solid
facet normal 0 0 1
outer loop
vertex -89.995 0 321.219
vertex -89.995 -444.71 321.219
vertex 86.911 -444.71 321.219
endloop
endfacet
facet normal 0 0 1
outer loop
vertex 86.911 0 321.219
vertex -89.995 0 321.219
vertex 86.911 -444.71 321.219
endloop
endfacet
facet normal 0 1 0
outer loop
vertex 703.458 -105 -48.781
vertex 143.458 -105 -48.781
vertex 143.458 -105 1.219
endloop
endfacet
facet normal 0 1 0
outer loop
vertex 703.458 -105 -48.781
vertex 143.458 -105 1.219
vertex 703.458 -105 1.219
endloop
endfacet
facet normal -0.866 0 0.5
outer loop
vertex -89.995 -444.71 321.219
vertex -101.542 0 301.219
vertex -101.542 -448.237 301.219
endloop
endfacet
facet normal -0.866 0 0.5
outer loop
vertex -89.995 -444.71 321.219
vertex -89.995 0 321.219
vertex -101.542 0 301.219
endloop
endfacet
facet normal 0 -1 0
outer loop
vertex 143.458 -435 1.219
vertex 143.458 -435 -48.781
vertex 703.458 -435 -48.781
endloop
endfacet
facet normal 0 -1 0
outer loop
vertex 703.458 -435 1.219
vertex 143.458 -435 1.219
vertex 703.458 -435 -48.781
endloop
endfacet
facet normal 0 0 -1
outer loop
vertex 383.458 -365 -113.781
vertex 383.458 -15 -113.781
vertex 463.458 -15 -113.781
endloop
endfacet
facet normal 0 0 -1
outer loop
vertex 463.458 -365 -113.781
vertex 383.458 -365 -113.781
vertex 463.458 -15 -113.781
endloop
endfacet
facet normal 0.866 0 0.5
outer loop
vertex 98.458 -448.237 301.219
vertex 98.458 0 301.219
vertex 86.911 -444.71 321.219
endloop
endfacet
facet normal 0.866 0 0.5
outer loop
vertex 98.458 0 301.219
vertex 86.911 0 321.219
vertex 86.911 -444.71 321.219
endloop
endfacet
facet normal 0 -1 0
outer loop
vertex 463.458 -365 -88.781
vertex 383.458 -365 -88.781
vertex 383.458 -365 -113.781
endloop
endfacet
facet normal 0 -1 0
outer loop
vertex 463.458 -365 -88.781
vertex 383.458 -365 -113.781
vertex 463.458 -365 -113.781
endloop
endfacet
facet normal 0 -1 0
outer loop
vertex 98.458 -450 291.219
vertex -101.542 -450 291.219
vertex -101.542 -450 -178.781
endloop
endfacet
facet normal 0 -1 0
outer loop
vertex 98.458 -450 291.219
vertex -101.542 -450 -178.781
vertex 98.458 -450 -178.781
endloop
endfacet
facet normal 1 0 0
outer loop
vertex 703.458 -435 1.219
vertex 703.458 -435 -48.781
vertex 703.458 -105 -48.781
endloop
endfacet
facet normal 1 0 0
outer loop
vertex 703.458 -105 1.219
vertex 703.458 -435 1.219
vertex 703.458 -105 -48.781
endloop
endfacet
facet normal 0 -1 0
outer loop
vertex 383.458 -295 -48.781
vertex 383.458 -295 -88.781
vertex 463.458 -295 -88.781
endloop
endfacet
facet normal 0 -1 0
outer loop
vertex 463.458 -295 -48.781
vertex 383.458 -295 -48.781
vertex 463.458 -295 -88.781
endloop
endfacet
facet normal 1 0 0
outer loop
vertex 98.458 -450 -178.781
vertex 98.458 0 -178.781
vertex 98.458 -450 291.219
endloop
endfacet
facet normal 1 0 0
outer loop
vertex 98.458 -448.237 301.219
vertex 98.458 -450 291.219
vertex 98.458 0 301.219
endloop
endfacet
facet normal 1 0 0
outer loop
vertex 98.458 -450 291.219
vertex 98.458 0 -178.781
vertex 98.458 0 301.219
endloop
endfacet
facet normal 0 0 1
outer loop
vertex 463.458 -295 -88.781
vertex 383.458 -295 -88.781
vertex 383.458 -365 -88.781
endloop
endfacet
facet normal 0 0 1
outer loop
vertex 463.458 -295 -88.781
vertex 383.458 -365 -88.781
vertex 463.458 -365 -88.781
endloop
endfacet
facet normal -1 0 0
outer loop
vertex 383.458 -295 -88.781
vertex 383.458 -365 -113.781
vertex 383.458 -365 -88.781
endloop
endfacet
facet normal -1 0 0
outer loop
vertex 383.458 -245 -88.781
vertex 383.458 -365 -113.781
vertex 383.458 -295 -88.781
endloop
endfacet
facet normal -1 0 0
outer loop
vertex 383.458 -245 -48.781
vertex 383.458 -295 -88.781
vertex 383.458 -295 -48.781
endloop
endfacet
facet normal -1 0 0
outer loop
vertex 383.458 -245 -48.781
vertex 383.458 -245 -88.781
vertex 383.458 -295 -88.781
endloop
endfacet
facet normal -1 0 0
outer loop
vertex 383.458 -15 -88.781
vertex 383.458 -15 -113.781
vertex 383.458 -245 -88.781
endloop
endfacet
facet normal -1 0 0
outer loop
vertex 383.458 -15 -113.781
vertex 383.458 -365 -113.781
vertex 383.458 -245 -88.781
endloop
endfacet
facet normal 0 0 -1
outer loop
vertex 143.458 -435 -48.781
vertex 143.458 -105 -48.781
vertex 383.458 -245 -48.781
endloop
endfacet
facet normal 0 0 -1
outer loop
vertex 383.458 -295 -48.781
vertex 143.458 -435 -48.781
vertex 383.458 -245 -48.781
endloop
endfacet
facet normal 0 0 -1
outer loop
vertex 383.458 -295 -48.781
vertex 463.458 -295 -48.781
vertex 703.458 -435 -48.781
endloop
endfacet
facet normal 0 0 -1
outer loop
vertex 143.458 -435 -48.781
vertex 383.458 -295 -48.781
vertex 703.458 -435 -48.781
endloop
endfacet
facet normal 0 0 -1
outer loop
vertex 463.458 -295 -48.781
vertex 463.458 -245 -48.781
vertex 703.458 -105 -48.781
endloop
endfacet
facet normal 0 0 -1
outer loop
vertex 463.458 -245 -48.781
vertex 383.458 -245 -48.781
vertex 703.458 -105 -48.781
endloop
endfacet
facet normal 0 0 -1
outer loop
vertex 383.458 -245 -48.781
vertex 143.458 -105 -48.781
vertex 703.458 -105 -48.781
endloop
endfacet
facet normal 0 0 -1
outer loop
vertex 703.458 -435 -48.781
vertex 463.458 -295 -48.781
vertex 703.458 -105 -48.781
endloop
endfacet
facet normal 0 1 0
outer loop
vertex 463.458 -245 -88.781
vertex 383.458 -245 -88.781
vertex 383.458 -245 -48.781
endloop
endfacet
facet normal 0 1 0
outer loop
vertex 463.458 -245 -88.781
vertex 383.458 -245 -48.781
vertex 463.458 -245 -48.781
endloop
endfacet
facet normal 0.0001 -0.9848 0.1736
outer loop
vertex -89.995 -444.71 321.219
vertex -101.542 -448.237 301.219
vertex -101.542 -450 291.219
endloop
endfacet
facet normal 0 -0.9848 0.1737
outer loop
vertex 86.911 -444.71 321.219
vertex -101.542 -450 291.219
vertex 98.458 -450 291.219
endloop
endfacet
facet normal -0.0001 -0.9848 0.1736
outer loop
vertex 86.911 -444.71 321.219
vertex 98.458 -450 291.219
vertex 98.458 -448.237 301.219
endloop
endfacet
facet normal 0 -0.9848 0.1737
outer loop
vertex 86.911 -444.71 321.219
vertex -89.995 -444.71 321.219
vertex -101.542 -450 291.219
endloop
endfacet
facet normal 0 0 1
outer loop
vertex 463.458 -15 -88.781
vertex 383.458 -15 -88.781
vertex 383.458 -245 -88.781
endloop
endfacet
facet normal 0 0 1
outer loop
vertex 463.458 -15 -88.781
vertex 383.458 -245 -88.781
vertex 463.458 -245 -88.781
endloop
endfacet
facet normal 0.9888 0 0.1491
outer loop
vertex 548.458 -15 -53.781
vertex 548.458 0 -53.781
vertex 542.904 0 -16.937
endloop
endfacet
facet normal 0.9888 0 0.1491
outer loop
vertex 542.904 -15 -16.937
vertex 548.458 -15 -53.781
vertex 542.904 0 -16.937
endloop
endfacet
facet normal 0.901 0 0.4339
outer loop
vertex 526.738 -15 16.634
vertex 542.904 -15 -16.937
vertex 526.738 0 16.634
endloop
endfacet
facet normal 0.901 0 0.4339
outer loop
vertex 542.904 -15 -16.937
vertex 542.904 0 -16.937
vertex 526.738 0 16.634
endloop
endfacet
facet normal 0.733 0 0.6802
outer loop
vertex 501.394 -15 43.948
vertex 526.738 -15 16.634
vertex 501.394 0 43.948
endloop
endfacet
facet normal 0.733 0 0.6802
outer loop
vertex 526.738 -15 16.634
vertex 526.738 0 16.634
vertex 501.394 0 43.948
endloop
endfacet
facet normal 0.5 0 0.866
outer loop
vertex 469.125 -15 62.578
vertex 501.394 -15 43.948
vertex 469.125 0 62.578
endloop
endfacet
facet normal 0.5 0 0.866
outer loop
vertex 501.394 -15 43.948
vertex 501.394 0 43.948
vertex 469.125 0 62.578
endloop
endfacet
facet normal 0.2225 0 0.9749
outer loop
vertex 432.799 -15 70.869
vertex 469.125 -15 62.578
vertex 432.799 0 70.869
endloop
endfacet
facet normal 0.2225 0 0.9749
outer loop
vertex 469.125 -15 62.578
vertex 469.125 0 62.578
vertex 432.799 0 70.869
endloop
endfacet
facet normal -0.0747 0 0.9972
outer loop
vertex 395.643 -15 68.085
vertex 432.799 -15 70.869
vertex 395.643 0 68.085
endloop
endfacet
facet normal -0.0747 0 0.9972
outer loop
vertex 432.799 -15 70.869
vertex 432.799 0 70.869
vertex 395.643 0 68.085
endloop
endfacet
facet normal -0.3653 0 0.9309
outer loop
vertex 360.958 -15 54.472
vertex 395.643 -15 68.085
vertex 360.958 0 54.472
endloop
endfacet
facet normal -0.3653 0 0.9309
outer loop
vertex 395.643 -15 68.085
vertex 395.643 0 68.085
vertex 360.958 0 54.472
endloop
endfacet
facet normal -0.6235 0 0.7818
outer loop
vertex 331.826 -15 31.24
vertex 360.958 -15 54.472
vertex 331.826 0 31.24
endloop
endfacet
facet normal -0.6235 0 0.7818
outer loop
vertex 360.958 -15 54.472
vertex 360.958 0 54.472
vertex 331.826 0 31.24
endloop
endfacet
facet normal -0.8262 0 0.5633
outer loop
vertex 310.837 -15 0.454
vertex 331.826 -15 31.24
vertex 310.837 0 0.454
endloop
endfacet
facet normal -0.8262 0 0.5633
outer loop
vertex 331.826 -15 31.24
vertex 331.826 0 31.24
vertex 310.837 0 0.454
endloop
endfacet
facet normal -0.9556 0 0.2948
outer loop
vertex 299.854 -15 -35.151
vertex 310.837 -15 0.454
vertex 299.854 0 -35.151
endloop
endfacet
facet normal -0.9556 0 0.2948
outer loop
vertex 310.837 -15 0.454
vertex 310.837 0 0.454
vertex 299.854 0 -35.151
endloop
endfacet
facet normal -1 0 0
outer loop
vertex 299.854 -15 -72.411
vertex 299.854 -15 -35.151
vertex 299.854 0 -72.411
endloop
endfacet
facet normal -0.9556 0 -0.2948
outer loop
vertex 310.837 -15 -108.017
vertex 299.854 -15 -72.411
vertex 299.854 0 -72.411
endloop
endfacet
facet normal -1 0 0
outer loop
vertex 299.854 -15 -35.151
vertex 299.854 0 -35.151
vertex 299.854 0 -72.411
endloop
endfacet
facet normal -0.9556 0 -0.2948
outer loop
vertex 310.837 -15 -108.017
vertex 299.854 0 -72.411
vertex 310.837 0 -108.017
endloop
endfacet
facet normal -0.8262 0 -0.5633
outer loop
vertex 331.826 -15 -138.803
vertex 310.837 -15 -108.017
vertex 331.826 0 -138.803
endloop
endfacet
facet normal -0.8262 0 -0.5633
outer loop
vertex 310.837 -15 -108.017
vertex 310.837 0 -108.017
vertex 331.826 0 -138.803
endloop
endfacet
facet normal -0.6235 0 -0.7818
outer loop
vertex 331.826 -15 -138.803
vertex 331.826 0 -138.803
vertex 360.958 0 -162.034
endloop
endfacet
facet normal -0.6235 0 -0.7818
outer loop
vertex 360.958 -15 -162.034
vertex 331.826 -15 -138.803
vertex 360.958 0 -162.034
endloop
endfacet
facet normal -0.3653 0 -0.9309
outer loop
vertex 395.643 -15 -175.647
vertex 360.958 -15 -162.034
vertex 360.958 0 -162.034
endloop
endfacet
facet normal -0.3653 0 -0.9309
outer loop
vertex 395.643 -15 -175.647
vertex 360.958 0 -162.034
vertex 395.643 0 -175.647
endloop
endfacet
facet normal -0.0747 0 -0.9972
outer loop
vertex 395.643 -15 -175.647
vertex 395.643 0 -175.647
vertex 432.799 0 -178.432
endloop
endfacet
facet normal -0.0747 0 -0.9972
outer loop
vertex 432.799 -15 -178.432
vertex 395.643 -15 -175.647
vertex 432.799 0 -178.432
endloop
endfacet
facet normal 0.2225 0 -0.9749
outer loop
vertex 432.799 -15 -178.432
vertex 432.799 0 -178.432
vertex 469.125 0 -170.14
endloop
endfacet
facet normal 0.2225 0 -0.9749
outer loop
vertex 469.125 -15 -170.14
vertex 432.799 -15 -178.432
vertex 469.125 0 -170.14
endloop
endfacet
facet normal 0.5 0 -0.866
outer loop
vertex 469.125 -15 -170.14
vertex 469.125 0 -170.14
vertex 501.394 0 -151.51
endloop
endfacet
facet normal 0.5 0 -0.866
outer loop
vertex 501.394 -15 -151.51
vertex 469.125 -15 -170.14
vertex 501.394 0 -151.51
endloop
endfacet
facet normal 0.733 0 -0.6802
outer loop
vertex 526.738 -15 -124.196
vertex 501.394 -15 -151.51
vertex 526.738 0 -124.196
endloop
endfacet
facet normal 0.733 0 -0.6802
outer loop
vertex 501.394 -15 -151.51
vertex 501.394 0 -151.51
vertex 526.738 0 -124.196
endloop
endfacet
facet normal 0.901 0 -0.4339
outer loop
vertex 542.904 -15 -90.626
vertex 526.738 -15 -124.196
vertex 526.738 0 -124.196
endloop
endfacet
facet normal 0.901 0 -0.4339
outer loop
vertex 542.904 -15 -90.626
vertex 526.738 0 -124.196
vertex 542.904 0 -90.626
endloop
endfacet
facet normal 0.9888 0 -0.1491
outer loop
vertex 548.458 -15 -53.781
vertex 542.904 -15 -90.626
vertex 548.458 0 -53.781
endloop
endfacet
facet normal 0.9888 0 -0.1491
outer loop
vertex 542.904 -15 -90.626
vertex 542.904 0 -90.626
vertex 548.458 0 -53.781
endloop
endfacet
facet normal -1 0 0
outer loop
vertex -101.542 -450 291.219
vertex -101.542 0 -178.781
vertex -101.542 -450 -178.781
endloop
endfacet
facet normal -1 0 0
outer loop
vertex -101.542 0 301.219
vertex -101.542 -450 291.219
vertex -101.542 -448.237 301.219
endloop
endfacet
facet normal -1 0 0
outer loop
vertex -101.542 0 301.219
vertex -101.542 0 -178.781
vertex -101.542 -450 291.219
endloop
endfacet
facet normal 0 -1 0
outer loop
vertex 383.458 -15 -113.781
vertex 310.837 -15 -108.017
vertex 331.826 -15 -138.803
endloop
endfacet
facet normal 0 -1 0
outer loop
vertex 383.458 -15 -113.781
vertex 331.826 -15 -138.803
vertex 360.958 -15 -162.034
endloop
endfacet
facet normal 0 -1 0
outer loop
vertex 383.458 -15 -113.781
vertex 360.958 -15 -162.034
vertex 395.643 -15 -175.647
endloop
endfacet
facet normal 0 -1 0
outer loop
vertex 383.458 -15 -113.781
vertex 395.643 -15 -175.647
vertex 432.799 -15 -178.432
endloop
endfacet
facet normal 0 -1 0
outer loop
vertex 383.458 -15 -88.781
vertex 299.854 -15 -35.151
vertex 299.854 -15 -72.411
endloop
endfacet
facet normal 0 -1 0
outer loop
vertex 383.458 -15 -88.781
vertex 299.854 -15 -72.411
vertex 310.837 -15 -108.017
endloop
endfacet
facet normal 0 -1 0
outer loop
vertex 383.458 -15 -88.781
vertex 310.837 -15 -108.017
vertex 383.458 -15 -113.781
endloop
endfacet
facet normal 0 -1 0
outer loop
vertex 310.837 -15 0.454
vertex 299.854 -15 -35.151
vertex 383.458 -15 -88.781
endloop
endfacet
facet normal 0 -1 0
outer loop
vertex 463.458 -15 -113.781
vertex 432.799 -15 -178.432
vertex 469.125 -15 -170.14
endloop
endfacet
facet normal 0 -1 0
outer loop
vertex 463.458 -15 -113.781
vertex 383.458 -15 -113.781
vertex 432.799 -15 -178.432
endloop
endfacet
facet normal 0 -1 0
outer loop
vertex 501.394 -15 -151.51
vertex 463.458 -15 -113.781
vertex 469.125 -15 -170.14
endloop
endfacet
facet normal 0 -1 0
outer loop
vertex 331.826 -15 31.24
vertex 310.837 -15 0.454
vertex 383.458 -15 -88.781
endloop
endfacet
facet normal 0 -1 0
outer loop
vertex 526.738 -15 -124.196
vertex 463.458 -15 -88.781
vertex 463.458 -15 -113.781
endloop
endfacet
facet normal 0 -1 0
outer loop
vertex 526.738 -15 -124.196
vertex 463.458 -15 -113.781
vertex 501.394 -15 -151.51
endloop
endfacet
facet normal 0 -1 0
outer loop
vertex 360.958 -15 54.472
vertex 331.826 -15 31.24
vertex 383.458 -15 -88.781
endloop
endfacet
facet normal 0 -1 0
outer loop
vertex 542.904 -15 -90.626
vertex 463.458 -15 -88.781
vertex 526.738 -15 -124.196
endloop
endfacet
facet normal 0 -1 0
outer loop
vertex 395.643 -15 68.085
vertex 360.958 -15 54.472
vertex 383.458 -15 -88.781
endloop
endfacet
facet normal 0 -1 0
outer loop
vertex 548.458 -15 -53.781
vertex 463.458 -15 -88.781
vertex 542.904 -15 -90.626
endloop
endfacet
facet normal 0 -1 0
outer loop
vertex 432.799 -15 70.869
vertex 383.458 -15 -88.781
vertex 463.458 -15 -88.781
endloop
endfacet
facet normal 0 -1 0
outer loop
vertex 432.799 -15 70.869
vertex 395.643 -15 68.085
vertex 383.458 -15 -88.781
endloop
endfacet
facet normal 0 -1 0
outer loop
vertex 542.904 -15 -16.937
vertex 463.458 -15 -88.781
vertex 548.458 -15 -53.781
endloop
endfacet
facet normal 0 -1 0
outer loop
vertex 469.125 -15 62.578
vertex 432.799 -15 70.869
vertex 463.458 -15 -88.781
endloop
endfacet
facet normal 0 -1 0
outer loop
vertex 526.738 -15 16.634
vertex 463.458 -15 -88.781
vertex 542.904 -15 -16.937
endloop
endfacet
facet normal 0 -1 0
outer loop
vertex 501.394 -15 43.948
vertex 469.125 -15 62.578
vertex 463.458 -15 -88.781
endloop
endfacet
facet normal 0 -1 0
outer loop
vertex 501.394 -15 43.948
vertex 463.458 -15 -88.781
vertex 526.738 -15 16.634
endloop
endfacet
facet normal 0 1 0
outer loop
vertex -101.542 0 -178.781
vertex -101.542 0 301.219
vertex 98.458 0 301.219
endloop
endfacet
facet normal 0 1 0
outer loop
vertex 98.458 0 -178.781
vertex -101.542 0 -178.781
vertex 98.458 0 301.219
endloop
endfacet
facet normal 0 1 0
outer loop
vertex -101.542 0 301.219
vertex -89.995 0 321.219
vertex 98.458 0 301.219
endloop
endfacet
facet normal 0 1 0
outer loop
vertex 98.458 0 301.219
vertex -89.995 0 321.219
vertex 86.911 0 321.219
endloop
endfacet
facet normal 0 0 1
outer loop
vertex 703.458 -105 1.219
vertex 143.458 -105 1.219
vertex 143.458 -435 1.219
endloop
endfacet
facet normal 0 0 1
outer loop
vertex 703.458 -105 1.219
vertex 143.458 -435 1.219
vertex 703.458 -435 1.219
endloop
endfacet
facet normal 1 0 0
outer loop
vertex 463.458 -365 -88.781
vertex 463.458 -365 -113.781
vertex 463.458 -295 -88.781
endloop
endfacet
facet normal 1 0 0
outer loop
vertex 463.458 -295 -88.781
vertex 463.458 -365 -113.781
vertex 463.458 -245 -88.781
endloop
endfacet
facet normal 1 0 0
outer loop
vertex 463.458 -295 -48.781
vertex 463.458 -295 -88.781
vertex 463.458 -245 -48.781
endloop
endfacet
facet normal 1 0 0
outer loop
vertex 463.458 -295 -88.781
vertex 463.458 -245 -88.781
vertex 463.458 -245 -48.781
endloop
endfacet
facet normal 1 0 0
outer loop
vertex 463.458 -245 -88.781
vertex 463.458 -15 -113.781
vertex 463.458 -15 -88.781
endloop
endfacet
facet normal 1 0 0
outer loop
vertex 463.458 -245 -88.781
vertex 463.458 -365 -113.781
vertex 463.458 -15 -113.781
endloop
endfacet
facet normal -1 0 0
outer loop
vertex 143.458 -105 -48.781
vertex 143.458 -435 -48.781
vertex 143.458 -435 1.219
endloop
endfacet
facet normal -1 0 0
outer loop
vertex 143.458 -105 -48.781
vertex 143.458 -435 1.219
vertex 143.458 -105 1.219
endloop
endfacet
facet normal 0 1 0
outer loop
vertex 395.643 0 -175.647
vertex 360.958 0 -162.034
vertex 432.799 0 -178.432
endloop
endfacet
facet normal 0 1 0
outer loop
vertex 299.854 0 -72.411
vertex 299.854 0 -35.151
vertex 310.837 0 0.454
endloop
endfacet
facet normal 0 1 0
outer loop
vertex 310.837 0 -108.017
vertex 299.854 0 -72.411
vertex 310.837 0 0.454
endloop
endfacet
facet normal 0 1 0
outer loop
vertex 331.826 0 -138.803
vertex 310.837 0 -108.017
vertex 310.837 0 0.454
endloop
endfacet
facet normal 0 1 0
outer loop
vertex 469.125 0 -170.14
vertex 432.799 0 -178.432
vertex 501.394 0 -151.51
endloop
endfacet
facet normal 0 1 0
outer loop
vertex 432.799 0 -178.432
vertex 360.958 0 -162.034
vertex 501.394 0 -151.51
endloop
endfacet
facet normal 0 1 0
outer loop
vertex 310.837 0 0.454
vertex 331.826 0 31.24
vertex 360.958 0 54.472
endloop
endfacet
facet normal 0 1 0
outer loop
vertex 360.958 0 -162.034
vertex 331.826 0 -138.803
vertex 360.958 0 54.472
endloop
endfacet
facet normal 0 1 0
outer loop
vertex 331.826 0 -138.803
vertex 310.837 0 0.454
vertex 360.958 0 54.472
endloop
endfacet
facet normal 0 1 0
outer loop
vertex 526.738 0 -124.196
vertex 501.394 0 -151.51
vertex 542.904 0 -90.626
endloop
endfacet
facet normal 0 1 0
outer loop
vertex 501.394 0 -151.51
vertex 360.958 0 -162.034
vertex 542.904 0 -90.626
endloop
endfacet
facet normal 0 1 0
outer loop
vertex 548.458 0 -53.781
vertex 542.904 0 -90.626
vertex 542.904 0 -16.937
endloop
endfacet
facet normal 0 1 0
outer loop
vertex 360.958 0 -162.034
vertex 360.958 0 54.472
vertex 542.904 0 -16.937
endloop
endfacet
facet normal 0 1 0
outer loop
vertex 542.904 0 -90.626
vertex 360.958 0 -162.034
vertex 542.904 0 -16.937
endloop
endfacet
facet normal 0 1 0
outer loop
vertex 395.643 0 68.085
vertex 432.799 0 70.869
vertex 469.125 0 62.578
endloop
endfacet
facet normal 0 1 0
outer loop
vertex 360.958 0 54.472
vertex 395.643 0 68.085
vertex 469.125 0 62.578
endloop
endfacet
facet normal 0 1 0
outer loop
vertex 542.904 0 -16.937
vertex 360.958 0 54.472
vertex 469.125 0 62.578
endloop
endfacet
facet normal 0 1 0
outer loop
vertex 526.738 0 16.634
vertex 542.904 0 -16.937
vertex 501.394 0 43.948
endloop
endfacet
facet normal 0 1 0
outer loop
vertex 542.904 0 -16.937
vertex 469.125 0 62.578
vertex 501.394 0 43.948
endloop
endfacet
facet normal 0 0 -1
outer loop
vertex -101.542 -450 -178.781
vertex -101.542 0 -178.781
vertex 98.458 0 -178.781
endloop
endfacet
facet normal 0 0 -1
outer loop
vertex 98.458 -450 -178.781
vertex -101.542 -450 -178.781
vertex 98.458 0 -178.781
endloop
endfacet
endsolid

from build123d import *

# Parameters (mm, degrees)
F0_W      = 200
F0_H      = 500
F1_DEPTH  = 450
F2_R      = 125
F3_DEPTH  = 15
F4_W      = 80
F4_H      = 25
F5_DEPTH  = 350
F6_W      = 80
F6_H      = 50
F7_DEPTH  = 40
F8_W      = 560
F8_H      = 330
F9_DEPTH  = 50
F10_SIZE2 = 11.547005
F10_SIZE  = 20
F11_SIZE2 = 5.289809
F11_SIZE  = 30


with BuildPart() as f1:
    # F0 (on Front) → F1 (new body)
    with BuildSketch(Plane.XZ):
        with Locations((-1.542339, 71.218807)):
            Rectangle(F0_W, F0_H)
    extrude(amount=F1_DEPTH)

    # F10
    f10_edges = [f1.edges().sort_by_distance(p)[0] for p in [
        (98.457661, -225, 321.218807),
        (-101.542339, -225, 321.218807),
    ]]
    chamfer(f10_edges, length=F10_SIZE, length2=F10_SIZE2)

    # F11
    f11_edges = [f1.edges().sort_by_distance(p)[0] for p in [
        (-1.542339, -450, 321.218807),
    ]]
    chamfer(f11_edges, length=F11_SIZE, length2=F11_SIZE2)


with BuildPart() as f3:
    # F2 (on Front) → F3 (new body)
    with BuildSketch(Plane.XZ):
        with Locations((423.457661, -53.781193)):
            Circle(F2_R)
    extrude(amount=F3_DEPTH)

    # F4 (on face) → F5 (join)
    with BuildSketch(Plane.XZ.offset(15)):
        with Locations((423.457661, -101.281193)):
            Rectangle(F4_W, F4_H)
    extrude(amount=F5_DEPTH)

    # F6 (on face) → F7 (join)
    with BuildSketch(Plane.XY.offset(-88.781193)):
        with Locations((423.457661, -270)):
            Rectangle(F6_W, F6_H)
    extrude(amount=F7_DEPTH)

    # F8 (on face) → F9 (join)
    with BuildSketch(Plane.XY.offset(-48.781193)):
        with Locations((423.457661, -270)):
            Rectangle(F8_W, F8_H)
    extrude(amount=F9_DEPTH)


solid = Compound([f1.part, f3.part])
